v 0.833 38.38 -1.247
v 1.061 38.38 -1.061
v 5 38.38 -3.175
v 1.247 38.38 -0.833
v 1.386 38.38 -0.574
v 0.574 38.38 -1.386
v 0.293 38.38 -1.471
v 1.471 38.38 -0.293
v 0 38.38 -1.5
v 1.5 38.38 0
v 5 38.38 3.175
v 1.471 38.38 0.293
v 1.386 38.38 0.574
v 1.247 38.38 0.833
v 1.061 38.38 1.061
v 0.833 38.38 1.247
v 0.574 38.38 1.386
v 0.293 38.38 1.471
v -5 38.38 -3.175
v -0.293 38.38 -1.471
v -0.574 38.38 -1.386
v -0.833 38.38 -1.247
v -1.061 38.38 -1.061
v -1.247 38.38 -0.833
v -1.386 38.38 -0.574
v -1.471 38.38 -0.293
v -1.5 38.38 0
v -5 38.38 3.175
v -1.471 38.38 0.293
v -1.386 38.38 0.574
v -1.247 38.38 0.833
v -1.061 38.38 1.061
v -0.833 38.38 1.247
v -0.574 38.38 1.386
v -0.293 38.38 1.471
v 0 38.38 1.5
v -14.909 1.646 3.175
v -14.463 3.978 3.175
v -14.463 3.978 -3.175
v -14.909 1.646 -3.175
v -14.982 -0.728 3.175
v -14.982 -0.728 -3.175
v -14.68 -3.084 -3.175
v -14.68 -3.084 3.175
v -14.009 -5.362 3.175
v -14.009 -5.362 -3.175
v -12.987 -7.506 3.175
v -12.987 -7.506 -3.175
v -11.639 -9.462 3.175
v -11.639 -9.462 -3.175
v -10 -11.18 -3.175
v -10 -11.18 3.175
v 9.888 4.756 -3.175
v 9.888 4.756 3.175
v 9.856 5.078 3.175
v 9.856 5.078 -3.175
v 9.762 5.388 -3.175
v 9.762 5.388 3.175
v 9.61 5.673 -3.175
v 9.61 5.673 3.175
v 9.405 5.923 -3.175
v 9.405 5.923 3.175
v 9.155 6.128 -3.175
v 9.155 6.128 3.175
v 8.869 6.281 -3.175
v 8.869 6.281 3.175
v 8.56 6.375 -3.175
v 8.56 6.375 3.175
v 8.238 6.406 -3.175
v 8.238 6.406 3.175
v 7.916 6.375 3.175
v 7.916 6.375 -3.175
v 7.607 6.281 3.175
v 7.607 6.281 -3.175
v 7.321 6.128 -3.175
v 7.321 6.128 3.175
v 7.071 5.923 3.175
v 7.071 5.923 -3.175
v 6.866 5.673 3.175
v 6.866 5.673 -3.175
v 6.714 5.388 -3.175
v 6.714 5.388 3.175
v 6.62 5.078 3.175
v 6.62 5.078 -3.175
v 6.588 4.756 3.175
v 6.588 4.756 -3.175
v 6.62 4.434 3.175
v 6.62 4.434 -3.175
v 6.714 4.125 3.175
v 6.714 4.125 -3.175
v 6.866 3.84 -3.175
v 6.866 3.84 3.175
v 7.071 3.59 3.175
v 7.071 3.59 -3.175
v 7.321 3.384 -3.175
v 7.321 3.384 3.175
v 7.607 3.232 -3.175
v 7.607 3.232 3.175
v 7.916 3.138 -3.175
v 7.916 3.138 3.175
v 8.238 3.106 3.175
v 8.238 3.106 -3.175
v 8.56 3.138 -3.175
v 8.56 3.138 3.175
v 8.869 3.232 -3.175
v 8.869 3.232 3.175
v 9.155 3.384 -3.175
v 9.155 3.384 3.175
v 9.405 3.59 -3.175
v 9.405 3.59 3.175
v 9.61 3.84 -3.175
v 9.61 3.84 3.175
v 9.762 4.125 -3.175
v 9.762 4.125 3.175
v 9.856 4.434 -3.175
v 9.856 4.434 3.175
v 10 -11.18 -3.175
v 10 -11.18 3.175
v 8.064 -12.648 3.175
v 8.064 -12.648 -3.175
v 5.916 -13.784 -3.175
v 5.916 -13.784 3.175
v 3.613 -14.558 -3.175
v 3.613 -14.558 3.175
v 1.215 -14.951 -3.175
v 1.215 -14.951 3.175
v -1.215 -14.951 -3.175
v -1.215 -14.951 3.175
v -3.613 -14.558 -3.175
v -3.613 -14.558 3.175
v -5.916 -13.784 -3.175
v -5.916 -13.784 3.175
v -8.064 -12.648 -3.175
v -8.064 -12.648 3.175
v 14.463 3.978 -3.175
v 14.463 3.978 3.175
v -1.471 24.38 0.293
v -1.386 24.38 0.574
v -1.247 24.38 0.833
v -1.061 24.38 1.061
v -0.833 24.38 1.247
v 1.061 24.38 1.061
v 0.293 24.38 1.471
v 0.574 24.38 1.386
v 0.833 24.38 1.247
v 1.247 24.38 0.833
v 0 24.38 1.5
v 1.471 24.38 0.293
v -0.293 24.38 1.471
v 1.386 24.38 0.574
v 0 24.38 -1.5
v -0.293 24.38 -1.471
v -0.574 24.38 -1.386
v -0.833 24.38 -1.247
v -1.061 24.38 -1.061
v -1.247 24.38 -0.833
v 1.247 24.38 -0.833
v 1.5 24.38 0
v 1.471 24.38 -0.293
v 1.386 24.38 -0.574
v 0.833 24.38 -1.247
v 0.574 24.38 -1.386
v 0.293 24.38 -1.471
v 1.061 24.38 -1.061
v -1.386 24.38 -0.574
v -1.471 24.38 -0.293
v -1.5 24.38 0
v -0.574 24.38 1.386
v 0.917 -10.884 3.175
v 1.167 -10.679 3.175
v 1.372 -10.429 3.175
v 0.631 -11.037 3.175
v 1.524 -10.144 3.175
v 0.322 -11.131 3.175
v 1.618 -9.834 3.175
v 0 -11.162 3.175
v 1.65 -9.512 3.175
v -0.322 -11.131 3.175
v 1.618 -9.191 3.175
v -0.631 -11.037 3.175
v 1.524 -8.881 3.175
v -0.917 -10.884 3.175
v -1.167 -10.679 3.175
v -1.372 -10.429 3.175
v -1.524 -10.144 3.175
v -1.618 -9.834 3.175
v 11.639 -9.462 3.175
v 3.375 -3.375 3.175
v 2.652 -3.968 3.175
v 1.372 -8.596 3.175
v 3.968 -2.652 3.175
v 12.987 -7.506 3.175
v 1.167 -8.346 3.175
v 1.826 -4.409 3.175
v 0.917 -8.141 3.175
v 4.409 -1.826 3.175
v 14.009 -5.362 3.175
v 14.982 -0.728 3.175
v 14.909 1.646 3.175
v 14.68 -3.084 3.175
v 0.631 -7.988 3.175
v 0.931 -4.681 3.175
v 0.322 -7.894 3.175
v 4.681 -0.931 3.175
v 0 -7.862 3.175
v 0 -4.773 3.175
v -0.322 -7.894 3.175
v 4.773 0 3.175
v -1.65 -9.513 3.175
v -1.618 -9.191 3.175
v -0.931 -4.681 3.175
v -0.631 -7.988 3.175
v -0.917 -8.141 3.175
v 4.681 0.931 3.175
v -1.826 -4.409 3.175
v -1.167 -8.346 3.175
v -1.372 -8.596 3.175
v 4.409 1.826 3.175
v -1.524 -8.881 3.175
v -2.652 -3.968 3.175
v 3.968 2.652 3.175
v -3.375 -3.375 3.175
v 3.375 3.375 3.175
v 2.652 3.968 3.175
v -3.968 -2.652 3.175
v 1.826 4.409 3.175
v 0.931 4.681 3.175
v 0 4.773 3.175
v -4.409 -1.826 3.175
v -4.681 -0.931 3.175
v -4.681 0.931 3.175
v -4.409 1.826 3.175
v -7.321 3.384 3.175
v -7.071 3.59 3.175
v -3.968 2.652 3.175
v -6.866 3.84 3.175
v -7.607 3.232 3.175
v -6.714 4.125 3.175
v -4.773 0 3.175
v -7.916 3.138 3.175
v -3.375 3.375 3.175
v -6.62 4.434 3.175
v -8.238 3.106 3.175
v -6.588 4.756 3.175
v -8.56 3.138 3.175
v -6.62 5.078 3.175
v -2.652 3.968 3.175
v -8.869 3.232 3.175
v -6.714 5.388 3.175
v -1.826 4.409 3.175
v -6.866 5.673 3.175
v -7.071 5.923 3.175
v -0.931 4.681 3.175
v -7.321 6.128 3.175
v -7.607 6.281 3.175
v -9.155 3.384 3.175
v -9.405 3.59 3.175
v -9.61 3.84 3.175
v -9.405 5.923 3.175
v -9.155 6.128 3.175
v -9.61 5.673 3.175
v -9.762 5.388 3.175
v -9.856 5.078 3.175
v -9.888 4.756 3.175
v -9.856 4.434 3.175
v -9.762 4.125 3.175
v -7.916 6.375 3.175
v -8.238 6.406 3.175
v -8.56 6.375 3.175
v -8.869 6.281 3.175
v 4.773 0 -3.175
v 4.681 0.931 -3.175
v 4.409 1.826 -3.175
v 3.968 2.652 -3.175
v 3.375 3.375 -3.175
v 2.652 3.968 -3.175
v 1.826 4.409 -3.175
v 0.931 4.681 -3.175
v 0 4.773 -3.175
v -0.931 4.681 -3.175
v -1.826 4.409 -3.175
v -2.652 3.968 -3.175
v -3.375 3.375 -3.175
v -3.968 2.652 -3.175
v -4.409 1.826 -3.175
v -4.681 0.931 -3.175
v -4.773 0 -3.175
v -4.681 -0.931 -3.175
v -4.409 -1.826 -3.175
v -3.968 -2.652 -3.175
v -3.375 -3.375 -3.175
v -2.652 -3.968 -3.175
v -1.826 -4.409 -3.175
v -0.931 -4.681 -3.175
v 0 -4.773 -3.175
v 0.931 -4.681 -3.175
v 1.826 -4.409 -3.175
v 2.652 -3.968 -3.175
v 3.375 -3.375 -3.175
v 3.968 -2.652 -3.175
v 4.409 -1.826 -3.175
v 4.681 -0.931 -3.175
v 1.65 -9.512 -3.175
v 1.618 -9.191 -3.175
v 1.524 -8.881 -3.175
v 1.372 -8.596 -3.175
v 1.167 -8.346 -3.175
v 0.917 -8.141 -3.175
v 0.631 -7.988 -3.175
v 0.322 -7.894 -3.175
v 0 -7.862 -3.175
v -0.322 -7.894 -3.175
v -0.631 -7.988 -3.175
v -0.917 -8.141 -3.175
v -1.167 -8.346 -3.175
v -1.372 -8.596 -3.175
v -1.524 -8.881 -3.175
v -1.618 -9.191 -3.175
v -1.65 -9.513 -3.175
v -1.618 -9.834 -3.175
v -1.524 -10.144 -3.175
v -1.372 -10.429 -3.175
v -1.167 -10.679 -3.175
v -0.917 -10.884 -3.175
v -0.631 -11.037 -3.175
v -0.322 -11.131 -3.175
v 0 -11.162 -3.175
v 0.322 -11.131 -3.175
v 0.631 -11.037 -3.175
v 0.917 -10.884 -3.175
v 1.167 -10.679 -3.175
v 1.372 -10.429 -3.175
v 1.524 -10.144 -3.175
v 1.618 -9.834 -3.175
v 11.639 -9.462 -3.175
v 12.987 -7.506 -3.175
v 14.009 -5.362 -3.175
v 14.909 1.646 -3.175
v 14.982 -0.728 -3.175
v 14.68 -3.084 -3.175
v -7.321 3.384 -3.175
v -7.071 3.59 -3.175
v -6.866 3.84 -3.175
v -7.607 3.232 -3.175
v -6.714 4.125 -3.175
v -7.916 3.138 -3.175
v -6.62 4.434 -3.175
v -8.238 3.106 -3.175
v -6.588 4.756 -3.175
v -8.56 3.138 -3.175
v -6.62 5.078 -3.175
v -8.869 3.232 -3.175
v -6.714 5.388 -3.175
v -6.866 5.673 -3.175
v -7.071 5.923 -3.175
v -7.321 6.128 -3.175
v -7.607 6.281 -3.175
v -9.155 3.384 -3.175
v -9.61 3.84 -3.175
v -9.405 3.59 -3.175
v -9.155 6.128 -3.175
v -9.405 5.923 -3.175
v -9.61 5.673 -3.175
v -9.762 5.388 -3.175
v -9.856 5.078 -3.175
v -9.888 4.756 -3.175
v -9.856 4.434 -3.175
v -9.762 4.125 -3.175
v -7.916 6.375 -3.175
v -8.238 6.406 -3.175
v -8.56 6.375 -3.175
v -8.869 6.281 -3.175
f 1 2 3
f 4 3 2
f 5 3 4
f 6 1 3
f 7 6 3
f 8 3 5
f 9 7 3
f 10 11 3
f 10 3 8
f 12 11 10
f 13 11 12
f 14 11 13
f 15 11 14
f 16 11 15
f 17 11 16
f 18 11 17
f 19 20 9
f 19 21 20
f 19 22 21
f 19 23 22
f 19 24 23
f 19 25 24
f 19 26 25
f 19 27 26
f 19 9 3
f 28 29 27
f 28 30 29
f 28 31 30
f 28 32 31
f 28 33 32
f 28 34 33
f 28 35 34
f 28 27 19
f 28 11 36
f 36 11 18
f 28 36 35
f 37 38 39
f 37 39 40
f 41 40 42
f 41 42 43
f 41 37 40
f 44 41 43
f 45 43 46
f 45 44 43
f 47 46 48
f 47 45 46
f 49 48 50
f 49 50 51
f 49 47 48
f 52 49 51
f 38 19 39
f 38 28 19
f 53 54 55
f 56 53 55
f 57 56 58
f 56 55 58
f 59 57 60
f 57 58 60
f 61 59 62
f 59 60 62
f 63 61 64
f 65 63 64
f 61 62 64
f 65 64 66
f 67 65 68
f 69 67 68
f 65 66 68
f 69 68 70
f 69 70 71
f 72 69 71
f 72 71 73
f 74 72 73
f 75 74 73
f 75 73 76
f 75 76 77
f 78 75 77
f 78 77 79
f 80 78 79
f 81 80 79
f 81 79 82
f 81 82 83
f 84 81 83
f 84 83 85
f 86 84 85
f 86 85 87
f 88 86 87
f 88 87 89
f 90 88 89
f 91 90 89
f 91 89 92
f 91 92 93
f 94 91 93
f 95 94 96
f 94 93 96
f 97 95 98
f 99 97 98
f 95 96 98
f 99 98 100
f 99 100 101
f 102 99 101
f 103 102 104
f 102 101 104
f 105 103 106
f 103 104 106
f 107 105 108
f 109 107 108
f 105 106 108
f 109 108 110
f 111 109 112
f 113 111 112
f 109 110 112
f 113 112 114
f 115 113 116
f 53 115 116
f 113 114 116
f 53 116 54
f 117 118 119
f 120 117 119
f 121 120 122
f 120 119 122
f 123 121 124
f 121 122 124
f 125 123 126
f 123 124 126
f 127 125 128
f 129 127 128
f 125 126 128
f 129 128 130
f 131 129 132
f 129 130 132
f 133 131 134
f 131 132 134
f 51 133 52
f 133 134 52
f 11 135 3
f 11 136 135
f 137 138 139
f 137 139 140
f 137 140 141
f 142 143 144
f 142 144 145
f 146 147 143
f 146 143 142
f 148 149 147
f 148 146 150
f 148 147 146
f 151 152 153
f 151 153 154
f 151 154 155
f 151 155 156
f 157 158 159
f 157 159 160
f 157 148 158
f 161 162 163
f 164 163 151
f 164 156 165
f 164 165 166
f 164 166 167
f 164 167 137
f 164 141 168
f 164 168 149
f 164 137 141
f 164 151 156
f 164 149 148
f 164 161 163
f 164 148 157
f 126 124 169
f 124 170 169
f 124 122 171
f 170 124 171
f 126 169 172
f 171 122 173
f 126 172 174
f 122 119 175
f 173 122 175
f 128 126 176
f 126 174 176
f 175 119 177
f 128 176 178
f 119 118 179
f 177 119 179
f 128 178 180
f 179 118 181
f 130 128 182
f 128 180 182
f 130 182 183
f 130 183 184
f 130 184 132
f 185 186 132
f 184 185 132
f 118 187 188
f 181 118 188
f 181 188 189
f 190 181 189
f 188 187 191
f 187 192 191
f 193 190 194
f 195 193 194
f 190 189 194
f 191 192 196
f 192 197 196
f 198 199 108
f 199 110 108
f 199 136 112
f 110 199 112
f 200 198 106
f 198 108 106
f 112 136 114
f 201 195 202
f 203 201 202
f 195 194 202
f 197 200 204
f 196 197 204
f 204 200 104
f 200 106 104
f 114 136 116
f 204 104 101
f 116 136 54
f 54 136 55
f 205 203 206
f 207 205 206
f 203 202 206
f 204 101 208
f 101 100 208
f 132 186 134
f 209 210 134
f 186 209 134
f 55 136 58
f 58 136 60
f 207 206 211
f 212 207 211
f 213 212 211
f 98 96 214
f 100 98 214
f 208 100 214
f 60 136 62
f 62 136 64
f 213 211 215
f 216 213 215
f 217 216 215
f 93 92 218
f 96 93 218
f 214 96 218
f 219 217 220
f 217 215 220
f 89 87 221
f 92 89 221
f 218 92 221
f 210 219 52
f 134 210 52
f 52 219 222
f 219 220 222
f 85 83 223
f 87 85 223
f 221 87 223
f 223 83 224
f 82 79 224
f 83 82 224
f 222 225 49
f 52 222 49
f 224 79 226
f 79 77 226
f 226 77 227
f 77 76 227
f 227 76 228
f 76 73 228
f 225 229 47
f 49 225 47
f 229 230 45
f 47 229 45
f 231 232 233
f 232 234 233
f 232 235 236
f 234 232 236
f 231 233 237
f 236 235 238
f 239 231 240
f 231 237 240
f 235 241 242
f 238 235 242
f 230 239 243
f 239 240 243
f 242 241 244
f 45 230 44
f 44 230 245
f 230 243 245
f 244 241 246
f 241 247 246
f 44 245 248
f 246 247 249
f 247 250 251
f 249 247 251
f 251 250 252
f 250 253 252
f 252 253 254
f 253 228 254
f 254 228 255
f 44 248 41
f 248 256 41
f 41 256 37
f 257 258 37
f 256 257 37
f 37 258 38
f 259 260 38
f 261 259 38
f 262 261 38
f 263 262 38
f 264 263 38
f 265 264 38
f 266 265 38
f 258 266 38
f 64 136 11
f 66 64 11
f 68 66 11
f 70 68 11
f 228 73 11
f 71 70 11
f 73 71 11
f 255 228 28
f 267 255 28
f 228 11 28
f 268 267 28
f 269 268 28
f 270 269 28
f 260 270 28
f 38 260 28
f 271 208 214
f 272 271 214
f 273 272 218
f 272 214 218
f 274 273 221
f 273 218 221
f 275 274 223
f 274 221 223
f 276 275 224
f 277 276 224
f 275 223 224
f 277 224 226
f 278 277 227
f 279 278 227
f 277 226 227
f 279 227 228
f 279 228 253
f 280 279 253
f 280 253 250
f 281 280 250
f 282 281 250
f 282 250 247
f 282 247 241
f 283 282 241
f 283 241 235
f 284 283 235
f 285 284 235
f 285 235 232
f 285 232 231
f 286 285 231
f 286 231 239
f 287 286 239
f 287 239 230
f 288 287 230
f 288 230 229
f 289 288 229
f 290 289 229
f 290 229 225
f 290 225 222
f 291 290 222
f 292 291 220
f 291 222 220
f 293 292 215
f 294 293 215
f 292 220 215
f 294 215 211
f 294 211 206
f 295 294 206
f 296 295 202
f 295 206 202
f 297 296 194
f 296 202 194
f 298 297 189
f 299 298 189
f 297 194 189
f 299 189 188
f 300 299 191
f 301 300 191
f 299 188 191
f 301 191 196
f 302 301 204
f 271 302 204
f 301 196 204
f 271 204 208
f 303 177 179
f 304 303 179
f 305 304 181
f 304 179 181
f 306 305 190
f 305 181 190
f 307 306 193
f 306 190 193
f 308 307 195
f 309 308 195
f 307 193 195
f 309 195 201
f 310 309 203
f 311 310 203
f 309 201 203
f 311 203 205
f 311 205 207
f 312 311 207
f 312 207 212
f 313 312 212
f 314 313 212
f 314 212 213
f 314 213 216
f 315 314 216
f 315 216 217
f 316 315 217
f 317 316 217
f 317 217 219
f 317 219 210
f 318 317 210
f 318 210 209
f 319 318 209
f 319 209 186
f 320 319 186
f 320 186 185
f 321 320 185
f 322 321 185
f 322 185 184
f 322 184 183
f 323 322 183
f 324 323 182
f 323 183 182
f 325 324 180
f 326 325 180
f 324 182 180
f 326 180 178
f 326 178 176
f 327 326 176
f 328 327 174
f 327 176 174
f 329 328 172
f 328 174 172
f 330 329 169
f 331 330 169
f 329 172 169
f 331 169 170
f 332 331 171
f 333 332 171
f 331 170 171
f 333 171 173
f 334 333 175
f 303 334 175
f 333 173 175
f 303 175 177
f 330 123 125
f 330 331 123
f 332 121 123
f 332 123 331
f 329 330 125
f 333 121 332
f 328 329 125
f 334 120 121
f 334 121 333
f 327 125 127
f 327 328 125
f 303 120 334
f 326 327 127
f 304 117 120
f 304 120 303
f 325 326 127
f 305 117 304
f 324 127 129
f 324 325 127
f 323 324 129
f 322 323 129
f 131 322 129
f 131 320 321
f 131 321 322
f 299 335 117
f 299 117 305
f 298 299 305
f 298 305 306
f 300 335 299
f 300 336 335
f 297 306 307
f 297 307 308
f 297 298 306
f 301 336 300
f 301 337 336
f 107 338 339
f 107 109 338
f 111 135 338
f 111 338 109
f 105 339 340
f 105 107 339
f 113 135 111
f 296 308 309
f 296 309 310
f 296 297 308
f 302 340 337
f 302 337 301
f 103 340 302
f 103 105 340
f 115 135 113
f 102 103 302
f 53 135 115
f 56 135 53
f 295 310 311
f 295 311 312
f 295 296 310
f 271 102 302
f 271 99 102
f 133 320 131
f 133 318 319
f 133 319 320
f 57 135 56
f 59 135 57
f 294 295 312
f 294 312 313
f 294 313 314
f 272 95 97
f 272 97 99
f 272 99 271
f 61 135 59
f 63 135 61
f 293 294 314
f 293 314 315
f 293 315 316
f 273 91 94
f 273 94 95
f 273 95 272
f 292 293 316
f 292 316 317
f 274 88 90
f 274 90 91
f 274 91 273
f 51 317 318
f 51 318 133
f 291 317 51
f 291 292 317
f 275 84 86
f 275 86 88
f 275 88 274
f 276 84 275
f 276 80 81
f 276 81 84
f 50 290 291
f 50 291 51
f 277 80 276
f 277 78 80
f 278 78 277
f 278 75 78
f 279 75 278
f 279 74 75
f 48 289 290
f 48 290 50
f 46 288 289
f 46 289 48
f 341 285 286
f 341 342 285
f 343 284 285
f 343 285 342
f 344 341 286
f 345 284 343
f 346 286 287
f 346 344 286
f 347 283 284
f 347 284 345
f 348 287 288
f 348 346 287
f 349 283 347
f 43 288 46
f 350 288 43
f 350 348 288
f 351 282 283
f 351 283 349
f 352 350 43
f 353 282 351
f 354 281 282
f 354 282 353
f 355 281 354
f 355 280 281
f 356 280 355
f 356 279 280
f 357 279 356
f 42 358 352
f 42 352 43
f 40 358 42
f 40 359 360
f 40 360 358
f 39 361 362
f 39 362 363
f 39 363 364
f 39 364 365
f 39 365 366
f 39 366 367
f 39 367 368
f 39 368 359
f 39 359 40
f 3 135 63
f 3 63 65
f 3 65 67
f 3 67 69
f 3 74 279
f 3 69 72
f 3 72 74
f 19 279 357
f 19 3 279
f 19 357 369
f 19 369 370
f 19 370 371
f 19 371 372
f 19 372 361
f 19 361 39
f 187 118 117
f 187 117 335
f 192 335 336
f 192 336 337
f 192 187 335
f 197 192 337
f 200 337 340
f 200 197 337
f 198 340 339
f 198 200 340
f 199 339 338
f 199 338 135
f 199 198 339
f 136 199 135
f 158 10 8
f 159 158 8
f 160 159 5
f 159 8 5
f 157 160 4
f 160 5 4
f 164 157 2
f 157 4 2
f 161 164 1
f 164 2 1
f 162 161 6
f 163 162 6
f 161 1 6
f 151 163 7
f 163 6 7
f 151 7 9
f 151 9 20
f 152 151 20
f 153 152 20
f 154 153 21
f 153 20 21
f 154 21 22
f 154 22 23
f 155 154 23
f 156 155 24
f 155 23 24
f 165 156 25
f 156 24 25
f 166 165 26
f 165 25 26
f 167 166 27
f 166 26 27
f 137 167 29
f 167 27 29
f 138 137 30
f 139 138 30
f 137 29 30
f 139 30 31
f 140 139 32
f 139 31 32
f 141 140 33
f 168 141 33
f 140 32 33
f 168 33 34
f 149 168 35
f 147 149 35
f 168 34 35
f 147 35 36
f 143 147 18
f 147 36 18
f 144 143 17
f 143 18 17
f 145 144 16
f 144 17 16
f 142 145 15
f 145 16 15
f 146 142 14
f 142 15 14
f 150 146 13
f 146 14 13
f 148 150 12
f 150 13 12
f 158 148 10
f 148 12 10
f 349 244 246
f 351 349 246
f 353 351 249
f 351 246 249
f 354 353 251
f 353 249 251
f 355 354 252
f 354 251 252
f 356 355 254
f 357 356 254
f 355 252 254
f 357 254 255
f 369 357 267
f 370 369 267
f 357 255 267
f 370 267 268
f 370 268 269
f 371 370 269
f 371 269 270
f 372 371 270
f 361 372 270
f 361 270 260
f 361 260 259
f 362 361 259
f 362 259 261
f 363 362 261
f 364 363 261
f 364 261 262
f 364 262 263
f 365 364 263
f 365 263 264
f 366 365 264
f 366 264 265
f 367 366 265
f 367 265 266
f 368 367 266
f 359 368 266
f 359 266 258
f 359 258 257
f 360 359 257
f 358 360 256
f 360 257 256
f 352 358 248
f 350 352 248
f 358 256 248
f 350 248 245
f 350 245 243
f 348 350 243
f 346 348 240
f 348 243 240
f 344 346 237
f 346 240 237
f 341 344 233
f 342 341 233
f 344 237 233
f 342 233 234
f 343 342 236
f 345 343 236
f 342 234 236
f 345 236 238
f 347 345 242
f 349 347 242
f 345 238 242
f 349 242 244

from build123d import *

# Parameters (mm, degrees)
BASE_DEPTH           = 3.175
BOSS_EXTRUDE1_DEPTH  = 6.35
SKETCH2_R            = 4.77266
SHAFT_AND_BOLT_DEPTH = 7.35
SKETCH5_R            = 1.5
CUT_EXTRUDE1_DEPTH   = 14
SKETCH6_R            = 1.65
CUT_EXTRUDE2_DEPTH   = 7.35


with BuildPart() as part:
    # Sketch1 → Base (new body, symmetric)
    with BuildSketch(Plane.XY):
        with BuildLine():
            Line((-5, 38.38), (-14.46282813, 3.978266268))
            ThreePointArc((-14.46282813, 3.978266268), (-14.389347628, -4.236351595), (-10, -11.180339887))
            Line((-10, -11.180339887), (10, -11.180339887))
            ThreePointArc((10, -11.180339887), (14.389347628, -4.236351595), (14.46282813, 3.978266268))
            Line((14.46282813, 3.978266268), (5, 38.38))
            Line((5, 38.38), (-5, 38.38))
        make_face()
    extrude(amount=BASE_DEPTH, both=True)

    # Sketch7 → Boss-Extrude1 (add)
    with BuildSketch(Plane.XY.offset(3.175)):
        with BuildLine():
            Line((-10, -11.180339887), (10, -11.180339887))
            ThreePointArc((10, -11.180339887), (0, -15), (-10, -11.180339887))
        make_face()
    extrude(amount=-BOSS_EXTRUDE1_DEPTH)

    # Sketch2 → Shaft and Bolt (cut, through all)
    with BuildSketch(Plane.XY.offset(3.175)):
        Circle(SKETCH2_R)
    extrude(amount=-SHAFT_AND_BOLT_DEPTH, mode=Mode.SUBTRACT)

    # Sketch5 → Cut-Extrude1 (cut)
    with BuildSketch(Plane(origin=(0, 38.38, 0), x_dir=(1, 0, 0), z_dir=(0, 1, 0))):
        Circle(SKETCH5_R)
    extrude(amount=-CUT_EXTRUDE1_DEPTH, mode=Mode.SUBTRACT)

    # Sketch6 → Cut-Extrude2 (cut, through all)
    with BuildSketch(Plane.XY.offset(3.175)):
        with Locations((0, -9.5125)):
            Circle(SKETCH6_R)
        with Locations((-8.238066653, 4.75625)):
            Circle(SKETCH6_R)
        with Locations((8.238066653, 4.75625)):
            Circle(SKETCH6_R)
    extrude(amount=-CUT_EXTRUDE2_DEPTH, mode=Mode.SUBTRACT)


solid = part.part
